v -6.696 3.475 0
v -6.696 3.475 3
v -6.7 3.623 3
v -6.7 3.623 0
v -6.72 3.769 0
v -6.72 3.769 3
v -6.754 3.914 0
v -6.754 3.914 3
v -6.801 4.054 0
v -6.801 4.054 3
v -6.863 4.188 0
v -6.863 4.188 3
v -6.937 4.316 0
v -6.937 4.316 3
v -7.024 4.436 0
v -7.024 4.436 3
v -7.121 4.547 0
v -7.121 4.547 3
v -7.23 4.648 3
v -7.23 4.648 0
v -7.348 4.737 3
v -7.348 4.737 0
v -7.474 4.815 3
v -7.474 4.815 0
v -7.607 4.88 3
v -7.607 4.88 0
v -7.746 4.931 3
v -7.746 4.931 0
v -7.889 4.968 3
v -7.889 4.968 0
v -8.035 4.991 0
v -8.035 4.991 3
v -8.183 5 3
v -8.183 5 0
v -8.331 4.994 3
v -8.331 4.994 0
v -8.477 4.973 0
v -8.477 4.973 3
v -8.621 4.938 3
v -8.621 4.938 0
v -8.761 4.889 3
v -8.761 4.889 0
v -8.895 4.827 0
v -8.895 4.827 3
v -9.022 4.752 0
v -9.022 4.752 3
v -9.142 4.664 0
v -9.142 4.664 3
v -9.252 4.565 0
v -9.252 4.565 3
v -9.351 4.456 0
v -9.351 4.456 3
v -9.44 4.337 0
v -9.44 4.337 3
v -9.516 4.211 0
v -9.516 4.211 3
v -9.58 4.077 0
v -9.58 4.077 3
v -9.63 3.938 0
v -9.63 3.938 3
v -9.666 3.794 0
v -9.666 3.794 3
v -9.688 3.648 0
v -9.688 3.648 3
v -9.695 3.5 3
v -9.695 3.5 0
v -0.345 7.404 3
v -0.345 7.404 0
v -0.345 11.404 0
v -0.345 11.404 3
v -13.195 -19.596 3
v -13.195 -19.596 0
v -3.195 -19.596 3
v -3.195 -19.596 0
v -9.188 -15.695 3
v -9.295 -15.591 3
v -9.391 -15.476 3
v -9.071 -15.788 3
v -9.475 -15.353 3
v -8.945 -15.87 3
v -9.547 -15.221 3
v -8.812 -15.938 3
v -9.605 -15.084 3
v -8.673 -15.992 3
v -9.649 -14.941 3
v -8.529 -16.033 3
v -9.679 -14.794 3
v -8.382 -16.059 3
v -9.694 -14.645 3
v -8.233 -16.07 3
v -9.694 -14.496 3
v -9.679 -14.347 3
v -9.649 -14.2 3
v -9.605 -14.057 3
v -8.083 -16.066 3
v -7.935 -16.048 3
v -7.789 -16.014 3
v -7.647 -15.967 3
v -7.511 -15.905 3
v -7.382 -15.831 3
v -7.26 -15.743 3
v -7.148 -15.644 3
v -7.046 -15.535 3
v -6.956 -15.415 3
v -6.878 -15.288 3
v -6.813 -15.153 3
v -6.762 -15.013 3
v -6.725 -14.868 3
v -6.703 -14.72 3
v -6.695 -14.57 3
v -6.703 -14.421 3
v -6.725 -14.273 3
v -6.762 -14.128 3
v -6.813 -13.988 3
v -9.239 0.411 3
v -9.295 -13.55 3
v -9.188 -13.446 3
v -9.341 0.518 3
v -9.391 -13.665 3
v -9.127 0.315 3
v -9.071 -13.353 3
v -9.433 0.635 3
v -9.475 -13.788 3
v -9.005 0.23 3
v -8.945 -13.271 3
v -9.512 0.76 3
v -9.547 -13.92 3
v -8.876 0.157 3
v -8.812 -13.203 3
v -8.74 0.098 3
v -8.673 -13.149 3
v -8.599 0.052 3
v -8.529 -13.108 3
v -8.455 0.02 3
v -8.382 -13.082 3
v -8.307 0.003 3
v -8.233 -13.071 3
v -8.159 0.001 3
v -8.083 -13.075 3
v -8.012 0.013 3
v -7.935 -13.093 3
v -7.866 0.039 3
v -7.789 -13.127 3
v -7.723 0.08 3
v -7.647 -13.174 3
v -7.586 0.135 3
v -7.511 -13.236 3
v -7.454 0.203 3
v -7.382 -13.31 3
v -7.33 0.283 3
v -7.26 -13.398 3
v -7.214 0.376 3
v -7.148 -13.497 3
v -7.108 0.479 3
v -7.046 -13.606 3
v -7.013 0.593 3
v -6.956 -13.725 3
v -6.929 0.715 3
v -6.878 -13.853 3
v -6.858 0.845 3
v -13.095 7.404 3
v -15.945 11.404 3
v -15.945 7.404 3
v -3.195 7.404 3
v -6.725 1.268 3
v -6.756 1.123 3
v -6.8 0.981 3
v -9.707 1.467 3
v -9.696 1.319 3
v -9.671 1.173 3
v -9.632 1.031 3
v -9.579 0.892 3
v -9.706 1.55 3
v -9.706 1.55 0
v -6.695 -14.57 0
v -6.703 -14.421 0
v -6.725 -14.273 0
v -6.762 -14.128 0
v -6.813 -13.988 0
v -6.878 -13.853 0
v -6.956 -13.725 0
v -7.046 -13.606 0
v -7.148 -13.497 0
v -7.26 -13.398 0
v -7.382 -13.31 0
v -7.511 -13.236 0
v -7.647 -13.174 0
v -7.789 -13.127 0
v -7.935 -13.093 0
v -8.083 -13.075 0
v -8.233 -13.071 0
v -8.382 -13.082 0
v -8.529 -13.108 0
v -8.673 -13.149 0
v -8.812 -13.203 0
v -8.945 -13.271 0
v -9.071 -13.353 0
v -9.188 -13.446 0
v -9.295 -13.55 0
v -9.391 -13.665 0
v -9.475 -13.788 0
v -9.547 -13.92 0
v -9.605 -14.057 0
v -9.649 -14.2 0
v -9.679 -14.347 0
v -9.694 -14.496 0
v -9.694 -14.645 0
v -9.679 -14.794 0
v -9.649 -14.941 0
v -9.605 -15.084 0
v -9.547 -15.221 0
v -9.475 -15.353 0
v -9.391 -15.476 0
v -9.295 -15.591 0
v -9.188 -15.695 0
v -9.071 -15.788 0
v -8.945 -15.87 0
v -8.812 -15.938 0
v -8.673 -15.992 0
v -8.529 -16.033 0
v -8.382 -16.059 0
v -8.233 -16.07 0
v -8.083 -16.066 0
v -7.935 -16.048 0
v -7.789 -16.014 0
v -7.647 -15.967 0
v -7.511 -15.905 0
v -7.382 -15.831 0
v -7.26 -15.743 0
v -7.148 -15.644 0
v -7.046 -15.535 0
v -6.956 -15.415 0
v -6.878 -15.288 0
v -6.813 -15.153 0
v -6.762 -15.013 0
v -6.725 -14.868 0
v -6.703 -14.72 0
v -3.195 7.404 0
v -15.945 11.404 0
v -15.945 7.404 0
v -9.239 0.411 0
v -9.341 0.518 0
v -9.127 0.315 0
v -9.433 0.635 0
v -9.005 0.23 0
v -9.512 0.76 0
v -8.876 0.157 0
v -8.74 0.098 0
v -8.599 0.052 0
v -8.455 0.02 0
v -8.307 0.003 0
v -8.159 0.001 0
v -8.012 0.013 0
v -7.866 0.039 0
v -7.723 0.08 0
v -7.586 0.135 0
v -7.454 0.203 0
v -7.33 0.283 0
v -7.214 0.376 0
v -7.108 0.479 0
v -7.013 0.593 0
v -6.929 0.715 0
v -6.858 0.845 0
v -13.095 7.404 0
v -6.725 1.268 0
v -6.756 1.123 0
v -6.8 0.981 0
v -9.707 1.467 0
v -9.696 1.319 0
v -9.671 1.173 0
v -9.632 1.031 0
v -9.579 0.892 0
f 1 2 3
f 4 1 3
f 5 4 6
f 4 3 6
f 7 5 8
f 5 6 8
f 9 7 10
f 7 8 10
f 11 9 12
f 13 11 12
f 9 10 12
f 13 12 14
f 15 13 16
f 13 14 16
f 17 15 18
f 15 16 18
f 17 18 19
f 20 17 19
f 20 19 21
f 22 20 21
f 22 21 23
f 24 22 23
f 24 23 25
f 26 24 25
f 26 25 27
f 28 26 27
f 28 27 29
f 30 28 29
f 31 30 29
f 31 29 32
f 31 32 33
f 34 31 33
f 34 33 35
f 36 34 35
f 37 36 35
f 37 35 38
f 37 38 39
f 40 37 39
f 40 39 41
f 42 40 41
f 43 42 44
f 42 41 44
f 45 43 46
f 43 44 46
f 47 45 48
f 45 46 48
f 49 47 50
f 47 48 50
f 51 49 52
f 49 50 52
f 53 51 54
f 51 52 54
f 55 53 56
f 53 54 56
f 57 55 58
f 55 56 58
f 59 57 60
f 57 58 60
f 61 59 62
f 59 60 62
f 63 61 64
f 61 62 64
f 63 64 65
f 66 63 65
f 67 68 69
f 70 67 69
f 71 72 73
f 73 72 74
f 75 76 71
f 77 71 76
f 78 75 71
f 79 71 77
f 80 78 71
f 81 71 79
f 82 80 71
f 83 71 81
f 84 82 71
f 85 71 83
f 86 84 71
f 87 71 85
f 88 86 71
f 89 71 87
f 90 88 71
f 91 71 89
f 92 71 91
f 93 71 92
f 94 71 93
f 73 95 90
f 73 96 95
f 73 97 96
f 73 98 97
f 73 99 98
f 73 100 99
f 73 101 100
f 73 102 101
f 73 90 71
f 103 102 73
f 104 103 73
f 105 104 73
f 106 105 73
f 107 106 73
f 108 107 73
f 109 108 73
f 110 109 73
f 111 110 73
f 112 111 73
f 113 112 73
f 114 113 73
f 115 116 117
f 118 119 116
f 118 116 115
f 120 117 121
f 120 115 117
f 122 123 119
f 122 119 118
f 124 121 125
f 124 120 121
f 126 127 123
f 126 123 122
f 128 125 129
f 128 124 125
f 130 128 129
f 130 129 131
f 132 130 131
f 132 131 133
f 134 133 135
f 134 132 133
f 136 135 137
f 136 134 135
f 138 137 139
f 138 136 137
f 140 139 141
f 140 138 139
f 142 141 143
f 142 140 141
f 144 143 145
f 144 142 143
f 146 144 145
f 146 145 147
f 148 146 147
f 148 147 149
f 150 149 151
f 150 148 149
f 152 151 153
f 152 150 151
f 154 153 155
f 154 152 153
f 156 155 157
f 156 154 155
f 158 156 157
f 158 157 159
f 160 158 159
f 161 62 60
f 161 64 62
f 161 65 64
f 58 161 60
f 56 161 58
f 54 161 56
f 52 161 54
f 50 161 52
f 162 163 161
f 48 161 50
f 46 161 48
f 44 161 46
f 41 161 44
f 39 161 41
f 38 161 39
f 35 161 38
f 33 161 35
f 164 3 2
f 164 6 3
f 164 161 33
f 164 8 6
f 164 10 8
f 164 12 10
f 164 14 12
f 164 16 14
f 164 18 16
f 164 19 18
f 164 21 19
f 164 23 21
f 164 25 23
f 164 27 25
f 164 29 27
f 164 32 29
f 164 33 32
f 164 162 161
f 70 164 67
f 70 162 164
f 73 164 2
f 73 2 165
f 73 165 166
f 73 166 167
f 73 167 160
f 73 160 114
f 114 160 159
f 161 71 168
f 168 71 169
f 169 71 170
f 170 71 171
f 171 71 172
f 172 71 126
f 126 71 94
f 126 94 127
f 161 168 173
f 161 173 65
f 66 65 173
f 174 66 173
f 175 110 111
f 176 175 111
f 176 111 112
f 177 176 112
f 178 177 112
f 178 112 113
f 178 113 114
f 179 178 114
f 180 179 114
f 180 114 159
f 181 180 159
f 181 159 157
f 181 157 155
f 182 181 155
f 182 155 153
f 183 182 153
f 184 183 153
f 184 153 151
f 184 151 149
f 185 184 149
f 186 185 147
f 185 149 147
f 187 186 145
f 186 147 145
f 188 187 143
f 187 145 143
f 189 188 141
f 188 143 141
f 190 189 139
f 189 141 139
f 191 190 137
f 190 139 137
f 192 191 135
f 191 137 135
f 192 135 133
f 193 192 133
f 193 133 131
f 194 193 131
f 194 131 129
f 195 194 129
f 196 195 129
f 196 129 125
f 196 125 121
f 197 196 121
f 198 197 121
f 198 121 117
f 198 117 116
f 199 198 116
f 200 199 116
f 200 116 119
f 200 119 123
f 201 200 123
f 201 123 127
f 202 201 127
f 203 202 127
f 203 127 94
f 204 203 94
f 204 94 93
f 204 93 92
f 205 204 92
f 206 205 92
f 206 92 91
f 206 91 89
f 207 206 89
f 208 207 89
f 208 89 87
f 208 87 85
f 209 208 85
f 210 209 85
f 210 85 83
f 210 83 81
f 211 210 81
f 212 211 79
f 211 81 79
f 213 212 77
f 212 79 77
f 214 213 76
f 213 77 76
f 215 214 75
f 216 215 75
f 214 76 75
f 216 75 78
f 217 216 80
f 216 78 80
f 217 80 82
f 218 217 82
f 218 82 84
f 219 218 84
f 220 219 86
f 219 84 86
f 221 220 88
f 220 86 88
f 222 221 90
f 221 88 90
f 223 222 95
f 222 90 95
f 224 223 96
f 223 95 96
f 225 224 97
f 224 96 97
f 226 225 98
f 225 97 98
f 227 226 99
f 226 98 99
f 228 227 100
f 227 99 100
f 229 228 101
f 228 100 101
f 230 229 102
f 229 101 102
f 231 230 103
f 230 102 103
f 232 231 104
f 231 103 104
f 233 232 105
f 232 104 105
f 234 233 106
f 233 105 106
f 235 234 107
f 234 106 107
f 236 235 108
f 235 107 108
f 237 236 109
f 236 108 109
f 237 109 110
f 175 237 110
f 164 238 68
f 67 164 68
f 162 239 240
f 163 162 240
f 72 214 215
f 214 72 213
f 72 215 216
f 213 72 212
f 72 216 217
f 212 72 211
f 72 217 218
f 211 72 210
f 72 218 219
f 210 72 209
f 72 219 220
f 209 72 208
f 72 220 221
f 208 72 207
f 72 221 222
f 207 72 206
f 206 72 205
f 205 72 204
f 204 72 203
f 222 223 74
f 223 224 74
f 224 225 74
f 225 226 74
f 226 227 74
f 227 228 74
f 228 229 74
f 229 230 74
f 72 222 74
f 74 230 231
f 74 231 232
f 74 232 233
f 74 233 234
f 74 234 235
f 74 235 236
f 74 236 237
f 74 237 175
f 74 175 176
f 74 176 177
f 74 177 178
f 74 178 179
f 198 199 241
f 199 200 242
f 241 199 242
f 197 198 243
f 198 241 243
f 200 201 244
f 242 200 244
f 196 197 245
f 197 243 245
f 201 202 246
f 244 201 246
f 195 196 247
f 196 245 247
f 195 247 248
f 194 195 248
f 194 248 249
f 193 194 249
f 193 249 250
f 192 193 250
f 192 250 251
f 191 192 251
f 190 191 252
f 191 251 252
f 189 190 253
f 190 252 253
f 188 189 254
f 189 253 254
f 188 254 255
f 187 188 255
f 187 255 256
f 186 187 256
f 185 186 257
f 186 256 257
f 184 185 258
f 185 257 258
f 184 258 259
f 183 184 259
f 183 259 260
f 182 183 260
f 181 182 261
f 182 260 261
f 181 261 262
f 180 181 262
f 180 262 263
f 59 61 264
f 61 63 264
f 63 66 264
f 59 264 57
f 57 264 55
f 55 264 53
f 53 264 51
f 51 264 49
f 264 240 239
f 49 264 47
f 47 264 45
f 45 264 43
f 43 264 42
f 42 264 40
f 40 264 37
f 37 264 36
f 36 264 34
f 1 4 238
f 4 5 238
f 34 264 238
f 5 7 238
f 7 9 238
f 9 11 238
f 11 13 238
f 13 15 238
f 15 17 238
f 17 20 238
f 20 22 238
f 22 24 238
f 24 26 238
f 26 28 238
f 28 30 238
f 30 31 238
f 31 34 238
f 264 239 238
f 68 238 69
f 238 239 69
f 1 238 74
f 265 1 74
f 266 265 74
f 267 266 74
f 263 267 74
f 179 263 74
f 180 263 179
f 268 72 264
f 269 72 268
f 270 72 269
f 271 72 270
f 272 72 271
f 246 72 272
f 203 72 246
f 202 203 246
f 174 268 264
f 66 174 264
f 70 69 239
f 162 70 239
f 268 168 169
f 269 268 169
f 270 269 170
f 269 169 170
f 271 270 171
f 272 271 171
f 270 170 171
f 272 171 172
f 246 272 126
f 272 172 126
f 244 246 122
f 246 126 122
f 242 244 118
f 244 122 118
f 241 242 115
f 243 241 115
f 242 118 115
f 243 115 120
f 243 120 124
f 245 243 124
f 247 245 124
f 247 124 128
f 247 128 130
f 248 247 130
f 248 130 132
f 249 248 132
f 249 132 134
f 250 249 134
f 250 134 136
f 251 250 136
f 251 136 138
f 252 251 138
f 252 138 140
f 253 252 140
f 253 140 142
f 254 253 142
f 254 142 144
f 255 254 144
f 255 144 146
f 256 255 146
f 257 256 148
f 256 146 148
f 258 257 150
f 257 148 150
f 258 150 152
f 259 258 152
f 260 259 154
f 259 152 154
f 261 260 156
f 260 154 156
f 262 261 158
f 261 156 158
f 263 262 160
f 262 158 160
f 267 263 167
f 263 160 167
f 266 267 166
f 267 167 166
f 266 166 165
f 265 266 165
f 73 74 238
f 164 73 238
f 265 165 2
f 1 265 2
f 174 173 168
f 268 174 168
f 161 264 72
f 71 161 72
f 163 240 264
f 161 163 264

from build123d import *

# Parameters (mm, degrees)
F1_DEPTH = 3
F2_R     = 1.5
F3_DEPTH = 3.001


with BuildPart() as f1:
    # F0 (on Top) → F1 (new body)
    with BuildSketch(Plane.XY):
        Polygon((-13.195418, -19.596273), (-3.195418, -19.596273), (-3.195418, 7.403542), (-0.345418, 7.403542), (-0.345418, 11.403542), (-15.945418, 11.403542), (-15.945418, 7.403542), (-13.095418, 7.403542), align=None)
    extrude(amount=F1_DEPTH)

    # F2 (on face) → F3 (cut, through all)
    with BuildSketch(Plane.XY.offset(3)):
        with BuildLine():
            Line((-9.695418, 3.499953), (-9.706427, 1.549641))
            Line((-9.706427, 1.549641), (-9.706892, 1.467193))
            ThreePointArc((-9.706892, 1.467193), (-8.307444, 0.003303), (-6.725357, 1.267591))
            Line((-6.725357, 1.267591), (-6.695629, 3.474782))
            ThreePointArc((-6.695629, 3.474782), (-8.182832, 4.999901), (-9.695418, 3.499953))
        make_face()
        with Locations((-8.195418, -14.570472)):
            Circle(F2_R)
    extrude(amount=-F3_DEPTH, mode=Mode.SUBTRACT)


solid = f1.part
